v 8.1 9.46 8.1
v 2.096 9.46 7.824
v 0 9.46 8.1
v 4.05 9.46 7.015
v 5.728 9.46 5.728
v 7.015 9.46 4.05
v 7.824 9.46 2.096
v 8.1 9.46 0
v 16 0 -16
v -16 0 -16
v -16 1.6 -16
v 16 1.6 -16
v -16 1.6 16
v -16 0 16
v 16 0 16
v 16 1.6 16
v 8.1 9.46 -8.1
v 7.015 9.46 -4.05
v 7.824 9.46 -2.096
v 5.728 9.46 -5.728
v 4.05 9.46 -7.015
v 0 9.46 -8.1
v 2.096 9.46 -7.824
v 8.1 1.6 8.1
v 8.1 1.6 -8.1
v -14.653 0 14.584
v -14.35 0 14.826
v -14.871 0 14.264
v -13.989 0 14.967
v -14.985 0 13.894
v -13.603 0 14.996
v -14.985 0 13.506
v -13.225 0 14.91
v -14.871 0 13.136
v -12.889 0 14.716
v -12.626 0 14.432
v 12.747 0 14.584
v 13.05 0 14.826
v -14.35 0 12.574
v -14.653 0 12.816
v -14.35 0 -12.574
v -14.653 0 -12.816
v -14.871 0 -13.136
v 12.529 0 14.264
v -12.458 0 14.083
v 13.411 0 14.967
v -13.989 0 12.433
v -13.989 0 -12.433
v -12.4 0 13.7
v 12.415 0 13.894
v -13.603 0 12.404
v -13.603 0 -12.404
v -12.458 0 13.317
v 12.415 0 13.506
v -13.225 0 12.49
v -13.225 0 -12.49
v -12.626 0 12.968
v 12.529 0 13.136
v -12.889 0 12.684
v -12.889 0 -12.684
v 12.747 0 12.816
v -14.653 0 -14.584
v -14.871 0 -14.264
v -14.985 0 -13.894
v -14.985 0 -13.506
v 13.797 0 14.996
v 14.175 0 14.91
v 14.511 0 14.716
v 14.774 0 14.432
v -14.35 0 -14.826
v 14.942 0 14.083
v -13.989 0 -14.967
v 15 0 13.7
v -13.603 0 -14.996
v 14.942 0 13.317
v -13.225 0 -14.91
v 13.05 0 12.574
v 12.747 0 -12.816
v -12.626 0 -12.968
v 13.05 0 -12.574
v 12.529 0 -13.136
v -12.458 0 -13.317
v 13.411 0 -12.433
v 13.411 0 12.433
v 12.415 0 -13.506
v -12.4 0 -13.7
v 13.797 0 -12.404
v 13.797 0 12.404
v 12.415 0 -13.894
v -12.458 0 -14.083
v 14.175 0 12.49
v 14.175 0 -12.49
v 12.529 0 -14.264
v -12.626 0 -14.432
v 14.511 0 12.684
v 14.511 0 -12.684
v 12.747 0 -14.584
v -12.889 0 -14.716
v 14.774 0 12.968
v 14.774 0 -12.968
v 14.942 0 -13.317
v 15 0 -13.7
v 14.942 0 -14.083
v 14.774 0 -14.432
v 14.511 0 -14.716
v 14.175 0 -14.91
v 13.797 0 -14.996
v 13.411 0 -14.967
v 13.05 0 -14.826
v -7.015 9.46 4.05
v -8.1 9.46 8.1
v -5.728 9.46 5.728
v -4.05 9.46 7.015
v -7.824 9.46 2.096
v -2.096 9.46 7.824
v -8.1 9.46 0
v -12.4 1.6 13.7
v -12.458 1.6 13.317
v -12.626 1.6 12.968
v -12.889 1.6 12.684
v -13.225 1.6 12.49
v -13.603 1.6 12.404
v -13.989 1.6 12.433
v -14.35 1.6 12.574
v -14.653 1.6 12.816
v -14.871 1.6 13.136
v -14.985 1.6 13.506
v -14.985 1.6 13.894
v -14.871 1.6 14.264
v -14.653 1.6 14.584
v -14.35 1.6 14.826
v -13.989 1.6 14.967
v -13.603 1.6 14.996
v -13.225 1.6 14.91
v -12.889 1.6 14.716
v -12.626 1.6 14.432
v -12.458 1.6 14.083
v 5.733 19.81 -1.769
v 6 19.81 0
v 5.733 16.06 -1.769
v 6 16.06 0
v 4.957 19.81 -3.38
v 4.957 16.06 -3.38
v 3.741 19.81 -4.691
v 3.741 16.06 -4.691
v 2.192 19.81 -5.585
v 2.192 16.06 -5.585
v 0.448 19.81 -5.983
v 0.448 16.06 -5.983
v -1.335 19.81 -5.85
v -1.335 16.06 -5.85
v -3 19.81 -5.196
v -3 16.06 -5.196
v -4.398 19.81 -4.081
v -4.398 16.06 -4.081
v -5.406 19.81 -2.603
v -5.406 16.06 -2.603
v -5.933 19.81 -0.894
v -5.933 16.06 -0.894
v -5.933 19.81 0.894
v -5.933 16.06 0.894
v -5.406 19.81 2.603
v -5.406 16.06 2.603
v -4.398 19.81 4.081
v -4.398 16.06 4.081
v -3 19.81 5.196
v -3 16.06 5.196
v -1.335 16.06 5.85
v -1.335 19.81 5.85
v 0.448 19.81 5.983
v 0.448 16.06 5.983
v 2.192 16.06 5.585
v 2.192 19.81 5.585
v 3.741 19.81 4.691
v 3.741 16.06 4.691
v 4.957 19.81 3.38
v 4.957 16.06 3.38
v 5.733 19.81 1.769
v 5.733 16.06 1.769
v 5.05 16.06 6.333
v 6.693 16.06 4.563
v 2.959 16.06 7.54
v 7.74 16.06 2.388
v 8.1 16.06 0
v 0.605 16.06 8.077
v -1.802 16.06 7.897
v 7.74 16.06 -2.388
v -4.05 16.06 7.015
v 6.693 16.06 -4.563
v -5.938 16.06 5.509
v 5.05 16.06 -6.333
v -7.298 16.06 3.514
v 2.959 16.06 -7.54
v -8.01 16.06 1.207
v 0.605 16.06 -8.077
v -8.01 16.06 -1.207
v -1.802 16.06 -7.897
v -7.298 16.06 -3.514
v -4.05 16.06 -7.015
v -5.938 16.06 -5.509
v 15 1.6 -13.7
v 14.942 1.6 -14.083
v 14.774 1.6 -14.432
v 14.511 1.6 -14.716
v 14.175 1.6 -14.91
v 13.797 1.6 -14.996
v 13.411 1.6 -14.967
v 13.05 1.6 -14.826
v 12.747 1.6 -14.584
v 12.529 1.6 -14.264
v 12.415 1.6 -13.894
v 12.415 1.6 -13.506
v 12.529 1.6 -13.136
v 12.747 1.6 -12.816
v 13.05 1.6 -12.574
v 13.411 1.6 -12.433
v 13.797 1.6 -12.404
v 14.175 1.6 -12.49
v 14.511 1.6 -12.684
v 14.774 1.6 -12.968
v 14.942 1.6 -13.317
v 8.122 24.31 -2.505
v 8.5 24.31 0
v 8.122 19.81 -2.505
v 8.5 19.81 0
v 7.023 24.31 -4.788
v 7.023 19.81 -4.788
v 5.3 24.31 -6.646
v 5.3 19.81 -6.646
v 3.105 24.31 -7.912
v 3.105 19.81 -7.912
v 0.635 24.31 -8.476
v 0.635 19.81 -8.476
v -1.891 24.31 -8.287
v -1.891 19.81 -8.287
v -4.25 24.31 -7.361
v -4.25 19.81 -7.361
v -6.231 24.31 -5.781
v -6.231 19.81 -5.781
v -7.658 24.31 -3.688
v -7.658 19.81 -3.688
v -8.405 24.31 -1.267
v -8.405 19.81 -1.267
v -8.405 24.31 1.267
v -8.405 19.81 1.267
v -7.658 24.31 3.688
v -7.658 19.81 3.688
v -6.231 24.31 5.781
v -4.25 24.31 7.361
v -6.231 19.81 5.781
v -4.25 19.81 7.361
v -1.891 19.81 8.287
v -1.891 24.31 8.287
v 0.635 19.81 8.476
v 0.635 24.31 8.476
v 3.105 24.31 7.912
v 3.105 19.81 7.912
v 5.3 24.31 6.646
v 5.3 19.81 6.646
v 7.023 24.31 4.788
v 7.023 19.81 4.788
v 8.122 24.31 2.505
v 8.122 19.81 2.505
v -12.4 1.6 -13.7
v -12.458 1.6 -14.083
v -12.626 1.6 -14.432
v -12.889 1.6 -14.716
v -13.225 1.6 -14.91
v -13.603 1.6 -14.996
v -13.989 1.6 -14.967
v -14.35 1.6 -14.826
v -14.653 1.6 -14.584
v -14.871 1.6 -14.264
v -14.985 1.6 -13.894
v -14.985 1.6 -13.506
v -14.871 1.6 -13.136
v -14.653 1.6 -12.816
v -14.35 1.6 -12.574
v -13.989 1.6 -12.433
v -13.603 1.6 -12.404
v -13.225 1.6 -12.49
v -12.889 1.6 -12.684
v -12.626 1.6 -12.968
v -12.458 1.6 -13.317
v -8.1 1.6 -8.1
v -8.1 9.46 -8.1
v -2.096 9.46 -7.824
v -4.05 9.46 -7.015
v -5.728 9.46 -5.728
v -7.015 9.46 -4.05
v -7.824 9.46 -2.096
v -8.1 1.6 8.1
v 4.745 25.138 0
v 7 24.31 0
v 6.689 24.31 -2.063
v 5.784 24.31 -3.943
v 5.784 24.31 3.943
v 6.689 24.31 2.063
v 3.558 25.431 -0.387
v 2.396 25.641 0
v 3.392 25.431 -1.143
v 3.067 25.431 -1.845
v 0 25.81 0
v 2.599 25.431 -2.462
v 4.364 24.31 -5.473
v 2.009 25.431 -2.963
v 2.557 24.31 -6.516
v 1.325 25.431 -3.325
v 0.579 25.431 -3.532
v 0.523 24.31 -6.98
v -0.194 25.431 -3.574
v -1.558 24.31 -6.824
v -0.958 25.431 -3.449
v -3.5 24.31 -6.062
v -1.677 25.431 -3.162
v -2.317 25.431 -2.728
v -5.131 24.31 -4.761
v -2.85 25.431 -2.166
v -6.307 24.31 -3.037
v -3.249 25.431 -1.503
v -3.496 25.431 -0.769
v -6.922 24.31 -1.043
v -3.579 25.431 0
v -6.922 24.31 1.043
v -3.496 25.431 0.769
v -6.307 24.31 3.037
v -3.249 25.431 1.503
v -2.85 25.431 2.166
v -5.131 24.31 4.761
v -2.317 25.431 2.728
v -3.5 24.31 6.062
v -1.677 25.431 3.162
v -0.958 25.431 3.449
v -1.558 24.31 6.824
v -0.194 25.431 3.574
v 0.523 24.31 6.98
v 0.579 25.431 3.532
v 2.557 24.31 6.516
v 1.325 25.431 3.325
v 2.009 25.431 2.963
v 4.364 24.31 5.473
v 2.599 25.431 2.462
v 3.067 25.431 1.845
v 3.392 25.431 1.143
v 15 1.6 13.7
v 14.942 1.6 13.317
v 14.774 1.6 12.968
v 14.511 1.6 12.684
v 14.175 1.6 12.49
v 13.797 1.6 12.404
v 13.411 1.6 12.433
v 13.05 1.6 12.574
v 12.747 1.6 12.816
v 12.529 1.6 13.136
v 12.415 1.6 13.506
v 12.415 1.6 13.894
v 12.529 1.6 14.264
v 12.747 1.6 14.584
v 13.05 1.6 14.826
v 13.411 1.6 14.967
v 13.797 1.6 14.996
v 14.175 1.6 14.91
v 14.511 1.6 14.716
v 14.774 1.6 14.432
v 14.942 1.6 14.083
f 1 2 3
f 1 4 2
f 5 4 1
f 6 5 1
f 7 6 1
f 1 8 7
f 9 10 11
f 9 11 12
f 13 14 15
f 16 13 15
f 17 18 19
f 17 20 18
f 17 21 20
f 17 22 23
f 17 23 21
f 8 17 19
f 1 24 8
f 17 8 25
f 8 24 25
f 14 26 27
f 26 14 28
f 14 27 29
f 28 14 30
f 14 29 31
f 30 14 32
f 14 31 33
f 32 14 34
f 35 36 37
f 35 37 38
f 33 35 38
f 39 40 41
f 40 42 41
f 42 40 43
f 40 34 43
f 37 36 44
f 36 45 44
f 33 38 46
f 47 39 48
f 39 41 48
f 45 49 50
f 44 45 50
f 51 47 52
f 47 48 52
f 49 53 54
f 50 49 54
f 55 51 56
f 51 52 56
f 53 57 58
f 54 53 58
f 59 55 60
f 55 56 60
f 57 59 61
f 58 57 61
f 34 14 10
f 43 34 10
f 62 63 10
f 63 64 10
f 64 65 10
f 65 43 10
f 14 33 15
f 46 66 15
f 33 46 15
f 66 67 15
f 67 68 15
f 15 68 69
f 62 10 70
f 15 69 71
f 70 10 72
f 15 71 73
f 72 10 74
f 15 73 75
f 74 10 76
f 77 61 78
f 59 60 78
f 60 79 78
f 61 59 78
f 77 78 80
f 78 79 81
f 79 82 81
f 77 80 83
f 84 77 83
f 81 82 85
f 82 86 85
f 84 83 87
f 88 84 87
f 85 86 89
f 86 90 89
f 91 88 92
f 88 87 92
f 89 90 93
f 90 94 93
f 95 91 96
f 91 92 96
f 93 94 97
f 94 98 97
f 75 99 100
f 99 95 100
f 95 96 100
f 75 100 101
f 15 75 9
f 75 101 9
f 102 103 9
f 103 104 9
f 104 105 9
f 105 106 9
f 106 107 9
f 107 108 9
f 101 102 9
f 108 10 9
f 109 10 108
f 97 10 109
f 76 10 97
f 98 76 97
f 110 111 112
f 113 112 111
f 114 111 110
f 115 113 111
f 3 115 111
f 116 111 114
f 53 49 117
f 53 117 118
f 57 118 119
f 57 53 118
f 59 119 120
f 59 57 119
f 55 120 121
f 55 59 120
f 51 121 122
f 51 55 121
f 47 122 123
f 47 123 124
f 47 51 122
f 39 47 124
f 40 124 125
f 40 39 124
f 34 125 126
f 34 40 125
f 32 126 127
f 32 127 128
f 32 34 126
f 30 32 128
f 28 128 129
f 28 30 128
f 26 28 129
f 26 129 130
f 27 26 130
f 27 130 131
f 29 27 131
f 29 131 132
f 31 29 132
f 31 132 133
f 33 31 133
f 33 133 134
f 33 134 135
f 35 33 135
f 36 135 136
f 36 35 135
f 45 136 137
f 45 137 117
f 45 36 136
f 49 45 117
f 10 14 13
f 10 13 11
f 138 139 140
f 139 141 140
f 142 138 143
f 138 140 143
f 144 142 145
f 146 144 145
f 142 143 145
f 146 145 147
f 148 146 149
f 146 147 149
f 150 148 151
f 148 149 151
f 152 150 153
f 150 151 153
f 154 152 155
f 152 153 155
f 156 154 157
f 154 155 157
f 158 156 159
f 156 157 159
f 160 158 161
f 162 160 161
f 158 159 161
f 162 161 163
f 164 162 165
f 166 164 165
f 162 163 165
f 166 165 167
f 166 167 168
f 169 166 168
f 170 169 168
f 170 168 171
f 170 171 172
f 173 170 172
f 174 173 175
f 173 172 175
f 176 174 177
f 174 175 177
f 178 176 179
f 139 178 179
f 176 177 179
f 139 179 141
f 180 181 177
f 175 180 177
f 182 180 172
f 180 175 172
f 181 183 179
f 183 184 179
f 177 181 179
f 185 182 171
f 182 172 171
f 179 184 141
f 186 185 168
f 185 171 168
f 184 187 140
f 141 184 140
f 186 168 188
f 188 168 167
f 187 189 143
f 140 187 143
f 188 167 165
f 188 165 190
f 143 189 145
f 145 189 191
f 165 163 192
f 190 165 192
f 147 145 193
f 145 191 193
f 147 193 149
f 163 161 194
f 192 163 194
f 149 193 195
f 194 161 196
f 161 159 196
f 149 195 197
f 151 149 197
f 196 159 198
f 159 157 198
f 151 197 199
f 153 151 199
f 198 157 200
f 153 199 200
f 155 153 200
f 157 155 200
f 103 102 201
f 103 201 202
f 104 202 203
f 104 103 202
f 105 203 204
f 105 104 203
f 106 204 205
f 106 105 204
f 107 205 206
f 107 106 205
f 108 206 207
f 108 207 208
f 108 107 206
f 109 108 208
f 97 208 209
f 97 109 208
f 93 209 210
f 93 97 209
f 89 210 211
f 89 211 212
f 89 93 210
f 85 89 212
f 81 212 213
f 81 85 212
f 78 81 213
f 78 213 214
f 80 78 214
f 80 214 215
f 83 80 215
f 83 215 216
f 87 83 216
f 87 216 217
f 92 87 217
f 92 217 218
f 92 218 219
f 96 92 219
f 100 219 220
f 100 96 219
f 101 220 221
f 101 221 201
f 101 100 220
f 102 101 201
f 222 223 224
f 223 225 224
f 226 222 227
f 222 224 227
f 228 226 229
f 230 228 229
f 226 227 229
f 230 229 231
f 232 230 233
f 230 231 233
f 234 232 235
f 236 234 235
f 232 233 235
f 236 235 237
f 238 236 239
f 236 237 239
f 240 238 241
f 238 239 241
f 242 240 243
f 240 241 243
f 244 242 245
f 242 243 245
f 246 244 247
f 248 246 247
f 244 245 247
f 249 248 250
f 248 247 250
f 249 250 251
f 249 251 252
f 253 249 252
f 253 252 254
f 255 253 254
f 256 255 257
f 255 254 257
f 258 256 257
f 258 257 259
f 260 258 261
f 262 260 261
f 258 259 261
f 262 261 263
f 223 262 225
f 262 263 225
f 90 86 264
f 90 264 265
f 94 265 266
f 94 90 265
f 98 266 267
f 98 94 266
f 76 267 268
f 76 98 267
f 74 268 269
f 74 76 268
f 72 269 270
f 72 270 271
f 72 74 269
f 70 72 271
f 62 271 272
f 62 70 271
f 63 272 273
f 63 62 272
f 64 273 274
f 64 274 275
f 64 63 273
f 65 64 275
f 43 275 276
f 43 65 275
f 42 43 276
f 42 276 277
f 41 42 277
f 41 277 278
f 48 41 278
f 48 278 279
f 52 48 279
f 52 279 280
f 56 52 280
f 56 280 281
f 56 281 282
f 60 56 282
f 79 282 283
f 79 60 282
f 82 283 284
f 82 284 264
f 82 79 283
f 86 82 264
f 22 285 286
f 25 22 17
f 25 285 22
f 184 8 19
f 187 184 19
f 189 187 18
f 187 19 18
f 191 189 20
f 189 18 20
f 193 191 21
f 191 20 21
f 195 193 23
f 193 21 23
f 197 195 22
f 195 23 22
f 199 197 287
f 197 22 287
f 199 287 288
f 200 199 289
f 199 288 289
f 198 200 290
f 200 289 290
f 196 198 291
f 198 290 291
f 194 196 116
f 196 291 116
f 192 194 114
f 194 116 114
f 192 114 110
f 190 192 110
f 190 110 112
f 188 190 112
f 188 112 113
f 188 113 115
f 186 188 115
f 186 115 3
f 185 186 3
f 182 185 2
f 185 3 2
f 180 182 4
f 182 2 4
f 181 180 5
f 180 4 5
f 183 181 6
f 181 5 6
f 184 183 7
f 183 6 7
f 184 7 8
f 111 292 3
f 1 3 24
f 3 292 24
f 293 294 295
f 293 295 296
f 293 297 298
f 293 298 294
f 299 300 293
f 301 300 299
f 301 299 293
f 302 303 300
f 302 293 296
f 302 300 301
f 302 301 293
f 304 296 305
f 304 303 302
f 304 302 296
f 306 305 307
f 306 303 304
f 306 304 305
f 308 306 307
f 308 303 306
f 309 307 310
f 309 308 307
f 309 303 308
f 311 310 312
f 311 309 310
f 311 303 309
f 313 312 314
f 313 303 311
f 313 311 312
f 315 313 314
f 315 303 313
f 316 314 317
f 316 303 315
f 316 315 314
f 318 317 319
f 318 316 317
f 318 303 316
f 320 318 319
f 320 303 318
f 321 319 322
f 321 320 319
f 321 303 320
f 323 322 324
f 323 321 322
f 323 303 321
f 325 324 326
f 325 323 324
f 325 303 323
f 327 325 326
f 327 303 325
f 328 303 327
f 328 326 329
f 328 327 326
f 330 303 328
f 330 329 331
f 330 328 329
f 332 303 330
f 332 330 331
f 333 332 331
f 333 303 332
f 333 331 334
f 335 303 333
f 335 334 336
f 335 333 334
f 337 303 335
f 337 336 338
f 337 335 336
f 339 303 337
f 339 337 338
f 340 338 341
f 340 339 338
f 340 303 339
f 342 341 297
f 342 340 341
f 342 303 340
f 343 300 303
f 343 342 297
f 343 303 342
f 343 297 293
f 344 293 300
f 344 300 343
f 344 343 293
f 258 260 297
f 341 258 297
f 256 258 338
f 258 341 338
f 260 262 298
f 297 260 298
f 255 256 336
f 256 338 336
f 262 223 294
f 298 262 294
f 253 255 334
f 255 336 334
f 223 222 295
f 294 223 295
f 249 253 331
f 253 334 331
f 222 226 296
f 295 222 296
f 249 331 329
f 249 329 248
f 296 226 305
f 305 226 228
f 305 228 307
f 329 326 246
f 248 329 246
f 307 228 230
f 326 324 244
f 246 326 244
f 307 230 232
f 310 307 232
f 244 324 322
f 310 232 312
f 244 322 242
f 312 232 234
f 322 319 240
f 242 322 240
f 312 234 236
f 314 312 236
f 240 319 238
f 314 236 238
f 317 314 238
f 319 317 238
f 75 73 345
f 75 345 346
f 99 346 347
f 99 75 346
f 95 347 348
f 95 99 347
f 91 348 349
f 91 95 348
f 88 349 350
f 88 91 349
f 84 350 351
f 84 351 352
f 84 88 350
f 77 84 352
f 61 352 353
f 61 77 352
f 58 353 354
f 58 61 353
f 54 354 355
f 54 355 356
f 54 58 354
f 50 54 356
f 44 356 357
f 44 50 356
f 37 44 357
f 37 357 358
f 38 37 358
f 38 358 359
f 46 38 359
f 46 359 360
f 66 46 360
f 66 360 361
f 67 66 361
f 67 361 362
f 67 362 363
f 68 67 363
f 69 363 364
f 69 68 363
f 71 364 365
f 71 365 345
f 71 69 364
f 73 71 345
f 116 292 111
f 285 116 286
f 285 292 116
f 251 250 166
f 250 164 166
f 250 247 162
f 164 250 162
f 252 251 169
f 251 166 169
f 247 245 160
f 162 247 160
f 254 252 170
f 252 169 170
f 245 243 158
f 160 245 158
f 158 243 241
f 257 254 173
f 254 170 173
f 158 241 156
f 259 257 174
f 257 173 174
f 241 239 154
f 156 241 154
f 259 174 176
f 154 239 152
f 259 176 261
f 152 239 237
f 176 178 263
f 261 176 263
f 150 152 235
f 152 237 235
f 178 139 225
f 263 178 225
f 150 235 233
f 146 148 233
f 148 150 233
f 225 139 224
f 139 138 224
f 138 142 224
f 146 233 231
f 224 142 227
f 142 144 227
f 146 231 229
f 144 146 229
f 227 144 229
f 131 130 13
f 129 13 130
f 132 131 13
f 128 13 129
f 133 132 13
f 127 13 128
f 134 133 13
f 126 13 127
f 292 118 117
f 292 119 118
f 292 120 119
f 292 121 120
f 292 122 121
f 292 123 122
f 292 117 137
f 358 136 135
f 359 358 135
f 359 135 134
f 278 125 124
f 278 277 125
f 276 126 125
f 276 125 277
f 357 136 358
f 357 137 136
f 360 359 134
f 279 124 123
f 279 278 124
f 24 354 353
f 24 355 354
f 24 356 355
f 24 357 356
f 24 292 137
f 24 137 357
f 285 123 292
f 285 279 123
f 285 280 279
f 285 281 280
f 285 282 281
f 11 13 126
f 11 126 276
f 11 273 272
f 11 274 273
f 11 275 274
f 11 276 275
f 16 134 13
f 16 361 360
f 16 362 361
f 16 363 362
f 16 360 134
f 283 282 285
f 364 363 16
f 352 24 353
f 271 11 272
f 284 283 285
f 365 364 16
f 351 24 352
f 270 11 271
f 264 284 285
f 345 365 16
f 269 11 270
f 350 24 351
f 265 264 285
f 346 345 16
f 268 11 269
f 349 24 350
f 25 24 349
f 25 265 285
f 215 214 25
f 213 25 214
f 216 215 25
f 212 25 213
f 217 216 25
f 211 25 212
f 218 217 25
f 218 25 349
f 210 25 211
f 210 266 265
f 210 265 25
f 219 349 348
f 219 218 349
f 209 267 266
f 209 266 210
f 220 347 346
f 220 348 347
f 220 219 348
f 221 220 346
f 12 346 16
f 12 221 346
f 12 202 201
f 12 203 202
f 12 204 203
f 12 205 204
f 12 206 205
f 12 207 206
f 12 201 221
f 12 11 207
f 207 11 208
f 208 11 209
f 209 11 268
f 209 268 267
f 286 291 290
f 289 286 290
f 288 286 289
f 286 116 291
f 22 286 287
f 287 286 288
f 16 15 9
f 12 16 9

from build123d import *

# Parameters (mm, degrees)
SKETCH1_W           = 32
SKETCH1_H           = 32
SKETCH1_R           = 1.3
BOSS_EXTRUDE1_DEPTH = 1.6
SKETCH2_W           = 16.2
SKETCH2_H           = 16.2
BOSS_EXTRUDE2_DEPTH = 7.86


with BuildPart() as part:
    # Sketch1 → Boss-Extrude1 (new body)
    with BuildSketch(Plane(origin=(0, 0, 0), x_dir=(1, 0, 0), z_dir=(0, 1, 0))):
        Rectangle(SKETCH1_W, SKETCH1_H)
        with Locations((-13.7, 13.7)):
            Circle(SKETCH1_R, mode=Mode.SUBTRACT)
        with Locations((13.7, 13.7)):
            Circle(SKETCH1_R, mode=Mode.SUBTRACT)
        with Locations((13.7, -13.7)):
            Circle(SKETCH1_R, mode=Mode.SUBTRACT)
        with Locations((-13.7, -13.7)):
            Circle(SKETCH1_R, mode=Mode.SUBTRACT)
    extrude(amount=BOSS_EXTRUDE1_DEPTH)

    # Sketch2 → Boss-Extrude2 (add)
    with BuildSketch(Plane(origin=(0, 1.6, 0), x_dir=(1, 0, 0), z_dir=(0, 1, 0))):
        Rectangle(SKETCH2_W, SKETCH2_H)
    extrude(amount=BOSS_EXTRUDE2_DEPTH)

    # Sketch4 → Revolve3 (revolve)
    with BuildSketch(Plane.XY):
        Polygon((0, 9.46), (0, 24.31), (8.5, 24.31), (8.5, 19.81), (6, 19.81), (6, 16.06), (8.1, 16.06), (8.1, 9.46), align=None)
        with BuildLine():
            Line((0, 25.81), (0, 24.31))
            Line((0, 24.31), (7, 24.31))
            ThreePointArc((7, 24.31), (3.579455266, 25.43079124), (0, 25.81))
        make_face()
    revolve(axis=Axis((0, 9.46, 0), (0, 1, 0)))


solid = part.part
